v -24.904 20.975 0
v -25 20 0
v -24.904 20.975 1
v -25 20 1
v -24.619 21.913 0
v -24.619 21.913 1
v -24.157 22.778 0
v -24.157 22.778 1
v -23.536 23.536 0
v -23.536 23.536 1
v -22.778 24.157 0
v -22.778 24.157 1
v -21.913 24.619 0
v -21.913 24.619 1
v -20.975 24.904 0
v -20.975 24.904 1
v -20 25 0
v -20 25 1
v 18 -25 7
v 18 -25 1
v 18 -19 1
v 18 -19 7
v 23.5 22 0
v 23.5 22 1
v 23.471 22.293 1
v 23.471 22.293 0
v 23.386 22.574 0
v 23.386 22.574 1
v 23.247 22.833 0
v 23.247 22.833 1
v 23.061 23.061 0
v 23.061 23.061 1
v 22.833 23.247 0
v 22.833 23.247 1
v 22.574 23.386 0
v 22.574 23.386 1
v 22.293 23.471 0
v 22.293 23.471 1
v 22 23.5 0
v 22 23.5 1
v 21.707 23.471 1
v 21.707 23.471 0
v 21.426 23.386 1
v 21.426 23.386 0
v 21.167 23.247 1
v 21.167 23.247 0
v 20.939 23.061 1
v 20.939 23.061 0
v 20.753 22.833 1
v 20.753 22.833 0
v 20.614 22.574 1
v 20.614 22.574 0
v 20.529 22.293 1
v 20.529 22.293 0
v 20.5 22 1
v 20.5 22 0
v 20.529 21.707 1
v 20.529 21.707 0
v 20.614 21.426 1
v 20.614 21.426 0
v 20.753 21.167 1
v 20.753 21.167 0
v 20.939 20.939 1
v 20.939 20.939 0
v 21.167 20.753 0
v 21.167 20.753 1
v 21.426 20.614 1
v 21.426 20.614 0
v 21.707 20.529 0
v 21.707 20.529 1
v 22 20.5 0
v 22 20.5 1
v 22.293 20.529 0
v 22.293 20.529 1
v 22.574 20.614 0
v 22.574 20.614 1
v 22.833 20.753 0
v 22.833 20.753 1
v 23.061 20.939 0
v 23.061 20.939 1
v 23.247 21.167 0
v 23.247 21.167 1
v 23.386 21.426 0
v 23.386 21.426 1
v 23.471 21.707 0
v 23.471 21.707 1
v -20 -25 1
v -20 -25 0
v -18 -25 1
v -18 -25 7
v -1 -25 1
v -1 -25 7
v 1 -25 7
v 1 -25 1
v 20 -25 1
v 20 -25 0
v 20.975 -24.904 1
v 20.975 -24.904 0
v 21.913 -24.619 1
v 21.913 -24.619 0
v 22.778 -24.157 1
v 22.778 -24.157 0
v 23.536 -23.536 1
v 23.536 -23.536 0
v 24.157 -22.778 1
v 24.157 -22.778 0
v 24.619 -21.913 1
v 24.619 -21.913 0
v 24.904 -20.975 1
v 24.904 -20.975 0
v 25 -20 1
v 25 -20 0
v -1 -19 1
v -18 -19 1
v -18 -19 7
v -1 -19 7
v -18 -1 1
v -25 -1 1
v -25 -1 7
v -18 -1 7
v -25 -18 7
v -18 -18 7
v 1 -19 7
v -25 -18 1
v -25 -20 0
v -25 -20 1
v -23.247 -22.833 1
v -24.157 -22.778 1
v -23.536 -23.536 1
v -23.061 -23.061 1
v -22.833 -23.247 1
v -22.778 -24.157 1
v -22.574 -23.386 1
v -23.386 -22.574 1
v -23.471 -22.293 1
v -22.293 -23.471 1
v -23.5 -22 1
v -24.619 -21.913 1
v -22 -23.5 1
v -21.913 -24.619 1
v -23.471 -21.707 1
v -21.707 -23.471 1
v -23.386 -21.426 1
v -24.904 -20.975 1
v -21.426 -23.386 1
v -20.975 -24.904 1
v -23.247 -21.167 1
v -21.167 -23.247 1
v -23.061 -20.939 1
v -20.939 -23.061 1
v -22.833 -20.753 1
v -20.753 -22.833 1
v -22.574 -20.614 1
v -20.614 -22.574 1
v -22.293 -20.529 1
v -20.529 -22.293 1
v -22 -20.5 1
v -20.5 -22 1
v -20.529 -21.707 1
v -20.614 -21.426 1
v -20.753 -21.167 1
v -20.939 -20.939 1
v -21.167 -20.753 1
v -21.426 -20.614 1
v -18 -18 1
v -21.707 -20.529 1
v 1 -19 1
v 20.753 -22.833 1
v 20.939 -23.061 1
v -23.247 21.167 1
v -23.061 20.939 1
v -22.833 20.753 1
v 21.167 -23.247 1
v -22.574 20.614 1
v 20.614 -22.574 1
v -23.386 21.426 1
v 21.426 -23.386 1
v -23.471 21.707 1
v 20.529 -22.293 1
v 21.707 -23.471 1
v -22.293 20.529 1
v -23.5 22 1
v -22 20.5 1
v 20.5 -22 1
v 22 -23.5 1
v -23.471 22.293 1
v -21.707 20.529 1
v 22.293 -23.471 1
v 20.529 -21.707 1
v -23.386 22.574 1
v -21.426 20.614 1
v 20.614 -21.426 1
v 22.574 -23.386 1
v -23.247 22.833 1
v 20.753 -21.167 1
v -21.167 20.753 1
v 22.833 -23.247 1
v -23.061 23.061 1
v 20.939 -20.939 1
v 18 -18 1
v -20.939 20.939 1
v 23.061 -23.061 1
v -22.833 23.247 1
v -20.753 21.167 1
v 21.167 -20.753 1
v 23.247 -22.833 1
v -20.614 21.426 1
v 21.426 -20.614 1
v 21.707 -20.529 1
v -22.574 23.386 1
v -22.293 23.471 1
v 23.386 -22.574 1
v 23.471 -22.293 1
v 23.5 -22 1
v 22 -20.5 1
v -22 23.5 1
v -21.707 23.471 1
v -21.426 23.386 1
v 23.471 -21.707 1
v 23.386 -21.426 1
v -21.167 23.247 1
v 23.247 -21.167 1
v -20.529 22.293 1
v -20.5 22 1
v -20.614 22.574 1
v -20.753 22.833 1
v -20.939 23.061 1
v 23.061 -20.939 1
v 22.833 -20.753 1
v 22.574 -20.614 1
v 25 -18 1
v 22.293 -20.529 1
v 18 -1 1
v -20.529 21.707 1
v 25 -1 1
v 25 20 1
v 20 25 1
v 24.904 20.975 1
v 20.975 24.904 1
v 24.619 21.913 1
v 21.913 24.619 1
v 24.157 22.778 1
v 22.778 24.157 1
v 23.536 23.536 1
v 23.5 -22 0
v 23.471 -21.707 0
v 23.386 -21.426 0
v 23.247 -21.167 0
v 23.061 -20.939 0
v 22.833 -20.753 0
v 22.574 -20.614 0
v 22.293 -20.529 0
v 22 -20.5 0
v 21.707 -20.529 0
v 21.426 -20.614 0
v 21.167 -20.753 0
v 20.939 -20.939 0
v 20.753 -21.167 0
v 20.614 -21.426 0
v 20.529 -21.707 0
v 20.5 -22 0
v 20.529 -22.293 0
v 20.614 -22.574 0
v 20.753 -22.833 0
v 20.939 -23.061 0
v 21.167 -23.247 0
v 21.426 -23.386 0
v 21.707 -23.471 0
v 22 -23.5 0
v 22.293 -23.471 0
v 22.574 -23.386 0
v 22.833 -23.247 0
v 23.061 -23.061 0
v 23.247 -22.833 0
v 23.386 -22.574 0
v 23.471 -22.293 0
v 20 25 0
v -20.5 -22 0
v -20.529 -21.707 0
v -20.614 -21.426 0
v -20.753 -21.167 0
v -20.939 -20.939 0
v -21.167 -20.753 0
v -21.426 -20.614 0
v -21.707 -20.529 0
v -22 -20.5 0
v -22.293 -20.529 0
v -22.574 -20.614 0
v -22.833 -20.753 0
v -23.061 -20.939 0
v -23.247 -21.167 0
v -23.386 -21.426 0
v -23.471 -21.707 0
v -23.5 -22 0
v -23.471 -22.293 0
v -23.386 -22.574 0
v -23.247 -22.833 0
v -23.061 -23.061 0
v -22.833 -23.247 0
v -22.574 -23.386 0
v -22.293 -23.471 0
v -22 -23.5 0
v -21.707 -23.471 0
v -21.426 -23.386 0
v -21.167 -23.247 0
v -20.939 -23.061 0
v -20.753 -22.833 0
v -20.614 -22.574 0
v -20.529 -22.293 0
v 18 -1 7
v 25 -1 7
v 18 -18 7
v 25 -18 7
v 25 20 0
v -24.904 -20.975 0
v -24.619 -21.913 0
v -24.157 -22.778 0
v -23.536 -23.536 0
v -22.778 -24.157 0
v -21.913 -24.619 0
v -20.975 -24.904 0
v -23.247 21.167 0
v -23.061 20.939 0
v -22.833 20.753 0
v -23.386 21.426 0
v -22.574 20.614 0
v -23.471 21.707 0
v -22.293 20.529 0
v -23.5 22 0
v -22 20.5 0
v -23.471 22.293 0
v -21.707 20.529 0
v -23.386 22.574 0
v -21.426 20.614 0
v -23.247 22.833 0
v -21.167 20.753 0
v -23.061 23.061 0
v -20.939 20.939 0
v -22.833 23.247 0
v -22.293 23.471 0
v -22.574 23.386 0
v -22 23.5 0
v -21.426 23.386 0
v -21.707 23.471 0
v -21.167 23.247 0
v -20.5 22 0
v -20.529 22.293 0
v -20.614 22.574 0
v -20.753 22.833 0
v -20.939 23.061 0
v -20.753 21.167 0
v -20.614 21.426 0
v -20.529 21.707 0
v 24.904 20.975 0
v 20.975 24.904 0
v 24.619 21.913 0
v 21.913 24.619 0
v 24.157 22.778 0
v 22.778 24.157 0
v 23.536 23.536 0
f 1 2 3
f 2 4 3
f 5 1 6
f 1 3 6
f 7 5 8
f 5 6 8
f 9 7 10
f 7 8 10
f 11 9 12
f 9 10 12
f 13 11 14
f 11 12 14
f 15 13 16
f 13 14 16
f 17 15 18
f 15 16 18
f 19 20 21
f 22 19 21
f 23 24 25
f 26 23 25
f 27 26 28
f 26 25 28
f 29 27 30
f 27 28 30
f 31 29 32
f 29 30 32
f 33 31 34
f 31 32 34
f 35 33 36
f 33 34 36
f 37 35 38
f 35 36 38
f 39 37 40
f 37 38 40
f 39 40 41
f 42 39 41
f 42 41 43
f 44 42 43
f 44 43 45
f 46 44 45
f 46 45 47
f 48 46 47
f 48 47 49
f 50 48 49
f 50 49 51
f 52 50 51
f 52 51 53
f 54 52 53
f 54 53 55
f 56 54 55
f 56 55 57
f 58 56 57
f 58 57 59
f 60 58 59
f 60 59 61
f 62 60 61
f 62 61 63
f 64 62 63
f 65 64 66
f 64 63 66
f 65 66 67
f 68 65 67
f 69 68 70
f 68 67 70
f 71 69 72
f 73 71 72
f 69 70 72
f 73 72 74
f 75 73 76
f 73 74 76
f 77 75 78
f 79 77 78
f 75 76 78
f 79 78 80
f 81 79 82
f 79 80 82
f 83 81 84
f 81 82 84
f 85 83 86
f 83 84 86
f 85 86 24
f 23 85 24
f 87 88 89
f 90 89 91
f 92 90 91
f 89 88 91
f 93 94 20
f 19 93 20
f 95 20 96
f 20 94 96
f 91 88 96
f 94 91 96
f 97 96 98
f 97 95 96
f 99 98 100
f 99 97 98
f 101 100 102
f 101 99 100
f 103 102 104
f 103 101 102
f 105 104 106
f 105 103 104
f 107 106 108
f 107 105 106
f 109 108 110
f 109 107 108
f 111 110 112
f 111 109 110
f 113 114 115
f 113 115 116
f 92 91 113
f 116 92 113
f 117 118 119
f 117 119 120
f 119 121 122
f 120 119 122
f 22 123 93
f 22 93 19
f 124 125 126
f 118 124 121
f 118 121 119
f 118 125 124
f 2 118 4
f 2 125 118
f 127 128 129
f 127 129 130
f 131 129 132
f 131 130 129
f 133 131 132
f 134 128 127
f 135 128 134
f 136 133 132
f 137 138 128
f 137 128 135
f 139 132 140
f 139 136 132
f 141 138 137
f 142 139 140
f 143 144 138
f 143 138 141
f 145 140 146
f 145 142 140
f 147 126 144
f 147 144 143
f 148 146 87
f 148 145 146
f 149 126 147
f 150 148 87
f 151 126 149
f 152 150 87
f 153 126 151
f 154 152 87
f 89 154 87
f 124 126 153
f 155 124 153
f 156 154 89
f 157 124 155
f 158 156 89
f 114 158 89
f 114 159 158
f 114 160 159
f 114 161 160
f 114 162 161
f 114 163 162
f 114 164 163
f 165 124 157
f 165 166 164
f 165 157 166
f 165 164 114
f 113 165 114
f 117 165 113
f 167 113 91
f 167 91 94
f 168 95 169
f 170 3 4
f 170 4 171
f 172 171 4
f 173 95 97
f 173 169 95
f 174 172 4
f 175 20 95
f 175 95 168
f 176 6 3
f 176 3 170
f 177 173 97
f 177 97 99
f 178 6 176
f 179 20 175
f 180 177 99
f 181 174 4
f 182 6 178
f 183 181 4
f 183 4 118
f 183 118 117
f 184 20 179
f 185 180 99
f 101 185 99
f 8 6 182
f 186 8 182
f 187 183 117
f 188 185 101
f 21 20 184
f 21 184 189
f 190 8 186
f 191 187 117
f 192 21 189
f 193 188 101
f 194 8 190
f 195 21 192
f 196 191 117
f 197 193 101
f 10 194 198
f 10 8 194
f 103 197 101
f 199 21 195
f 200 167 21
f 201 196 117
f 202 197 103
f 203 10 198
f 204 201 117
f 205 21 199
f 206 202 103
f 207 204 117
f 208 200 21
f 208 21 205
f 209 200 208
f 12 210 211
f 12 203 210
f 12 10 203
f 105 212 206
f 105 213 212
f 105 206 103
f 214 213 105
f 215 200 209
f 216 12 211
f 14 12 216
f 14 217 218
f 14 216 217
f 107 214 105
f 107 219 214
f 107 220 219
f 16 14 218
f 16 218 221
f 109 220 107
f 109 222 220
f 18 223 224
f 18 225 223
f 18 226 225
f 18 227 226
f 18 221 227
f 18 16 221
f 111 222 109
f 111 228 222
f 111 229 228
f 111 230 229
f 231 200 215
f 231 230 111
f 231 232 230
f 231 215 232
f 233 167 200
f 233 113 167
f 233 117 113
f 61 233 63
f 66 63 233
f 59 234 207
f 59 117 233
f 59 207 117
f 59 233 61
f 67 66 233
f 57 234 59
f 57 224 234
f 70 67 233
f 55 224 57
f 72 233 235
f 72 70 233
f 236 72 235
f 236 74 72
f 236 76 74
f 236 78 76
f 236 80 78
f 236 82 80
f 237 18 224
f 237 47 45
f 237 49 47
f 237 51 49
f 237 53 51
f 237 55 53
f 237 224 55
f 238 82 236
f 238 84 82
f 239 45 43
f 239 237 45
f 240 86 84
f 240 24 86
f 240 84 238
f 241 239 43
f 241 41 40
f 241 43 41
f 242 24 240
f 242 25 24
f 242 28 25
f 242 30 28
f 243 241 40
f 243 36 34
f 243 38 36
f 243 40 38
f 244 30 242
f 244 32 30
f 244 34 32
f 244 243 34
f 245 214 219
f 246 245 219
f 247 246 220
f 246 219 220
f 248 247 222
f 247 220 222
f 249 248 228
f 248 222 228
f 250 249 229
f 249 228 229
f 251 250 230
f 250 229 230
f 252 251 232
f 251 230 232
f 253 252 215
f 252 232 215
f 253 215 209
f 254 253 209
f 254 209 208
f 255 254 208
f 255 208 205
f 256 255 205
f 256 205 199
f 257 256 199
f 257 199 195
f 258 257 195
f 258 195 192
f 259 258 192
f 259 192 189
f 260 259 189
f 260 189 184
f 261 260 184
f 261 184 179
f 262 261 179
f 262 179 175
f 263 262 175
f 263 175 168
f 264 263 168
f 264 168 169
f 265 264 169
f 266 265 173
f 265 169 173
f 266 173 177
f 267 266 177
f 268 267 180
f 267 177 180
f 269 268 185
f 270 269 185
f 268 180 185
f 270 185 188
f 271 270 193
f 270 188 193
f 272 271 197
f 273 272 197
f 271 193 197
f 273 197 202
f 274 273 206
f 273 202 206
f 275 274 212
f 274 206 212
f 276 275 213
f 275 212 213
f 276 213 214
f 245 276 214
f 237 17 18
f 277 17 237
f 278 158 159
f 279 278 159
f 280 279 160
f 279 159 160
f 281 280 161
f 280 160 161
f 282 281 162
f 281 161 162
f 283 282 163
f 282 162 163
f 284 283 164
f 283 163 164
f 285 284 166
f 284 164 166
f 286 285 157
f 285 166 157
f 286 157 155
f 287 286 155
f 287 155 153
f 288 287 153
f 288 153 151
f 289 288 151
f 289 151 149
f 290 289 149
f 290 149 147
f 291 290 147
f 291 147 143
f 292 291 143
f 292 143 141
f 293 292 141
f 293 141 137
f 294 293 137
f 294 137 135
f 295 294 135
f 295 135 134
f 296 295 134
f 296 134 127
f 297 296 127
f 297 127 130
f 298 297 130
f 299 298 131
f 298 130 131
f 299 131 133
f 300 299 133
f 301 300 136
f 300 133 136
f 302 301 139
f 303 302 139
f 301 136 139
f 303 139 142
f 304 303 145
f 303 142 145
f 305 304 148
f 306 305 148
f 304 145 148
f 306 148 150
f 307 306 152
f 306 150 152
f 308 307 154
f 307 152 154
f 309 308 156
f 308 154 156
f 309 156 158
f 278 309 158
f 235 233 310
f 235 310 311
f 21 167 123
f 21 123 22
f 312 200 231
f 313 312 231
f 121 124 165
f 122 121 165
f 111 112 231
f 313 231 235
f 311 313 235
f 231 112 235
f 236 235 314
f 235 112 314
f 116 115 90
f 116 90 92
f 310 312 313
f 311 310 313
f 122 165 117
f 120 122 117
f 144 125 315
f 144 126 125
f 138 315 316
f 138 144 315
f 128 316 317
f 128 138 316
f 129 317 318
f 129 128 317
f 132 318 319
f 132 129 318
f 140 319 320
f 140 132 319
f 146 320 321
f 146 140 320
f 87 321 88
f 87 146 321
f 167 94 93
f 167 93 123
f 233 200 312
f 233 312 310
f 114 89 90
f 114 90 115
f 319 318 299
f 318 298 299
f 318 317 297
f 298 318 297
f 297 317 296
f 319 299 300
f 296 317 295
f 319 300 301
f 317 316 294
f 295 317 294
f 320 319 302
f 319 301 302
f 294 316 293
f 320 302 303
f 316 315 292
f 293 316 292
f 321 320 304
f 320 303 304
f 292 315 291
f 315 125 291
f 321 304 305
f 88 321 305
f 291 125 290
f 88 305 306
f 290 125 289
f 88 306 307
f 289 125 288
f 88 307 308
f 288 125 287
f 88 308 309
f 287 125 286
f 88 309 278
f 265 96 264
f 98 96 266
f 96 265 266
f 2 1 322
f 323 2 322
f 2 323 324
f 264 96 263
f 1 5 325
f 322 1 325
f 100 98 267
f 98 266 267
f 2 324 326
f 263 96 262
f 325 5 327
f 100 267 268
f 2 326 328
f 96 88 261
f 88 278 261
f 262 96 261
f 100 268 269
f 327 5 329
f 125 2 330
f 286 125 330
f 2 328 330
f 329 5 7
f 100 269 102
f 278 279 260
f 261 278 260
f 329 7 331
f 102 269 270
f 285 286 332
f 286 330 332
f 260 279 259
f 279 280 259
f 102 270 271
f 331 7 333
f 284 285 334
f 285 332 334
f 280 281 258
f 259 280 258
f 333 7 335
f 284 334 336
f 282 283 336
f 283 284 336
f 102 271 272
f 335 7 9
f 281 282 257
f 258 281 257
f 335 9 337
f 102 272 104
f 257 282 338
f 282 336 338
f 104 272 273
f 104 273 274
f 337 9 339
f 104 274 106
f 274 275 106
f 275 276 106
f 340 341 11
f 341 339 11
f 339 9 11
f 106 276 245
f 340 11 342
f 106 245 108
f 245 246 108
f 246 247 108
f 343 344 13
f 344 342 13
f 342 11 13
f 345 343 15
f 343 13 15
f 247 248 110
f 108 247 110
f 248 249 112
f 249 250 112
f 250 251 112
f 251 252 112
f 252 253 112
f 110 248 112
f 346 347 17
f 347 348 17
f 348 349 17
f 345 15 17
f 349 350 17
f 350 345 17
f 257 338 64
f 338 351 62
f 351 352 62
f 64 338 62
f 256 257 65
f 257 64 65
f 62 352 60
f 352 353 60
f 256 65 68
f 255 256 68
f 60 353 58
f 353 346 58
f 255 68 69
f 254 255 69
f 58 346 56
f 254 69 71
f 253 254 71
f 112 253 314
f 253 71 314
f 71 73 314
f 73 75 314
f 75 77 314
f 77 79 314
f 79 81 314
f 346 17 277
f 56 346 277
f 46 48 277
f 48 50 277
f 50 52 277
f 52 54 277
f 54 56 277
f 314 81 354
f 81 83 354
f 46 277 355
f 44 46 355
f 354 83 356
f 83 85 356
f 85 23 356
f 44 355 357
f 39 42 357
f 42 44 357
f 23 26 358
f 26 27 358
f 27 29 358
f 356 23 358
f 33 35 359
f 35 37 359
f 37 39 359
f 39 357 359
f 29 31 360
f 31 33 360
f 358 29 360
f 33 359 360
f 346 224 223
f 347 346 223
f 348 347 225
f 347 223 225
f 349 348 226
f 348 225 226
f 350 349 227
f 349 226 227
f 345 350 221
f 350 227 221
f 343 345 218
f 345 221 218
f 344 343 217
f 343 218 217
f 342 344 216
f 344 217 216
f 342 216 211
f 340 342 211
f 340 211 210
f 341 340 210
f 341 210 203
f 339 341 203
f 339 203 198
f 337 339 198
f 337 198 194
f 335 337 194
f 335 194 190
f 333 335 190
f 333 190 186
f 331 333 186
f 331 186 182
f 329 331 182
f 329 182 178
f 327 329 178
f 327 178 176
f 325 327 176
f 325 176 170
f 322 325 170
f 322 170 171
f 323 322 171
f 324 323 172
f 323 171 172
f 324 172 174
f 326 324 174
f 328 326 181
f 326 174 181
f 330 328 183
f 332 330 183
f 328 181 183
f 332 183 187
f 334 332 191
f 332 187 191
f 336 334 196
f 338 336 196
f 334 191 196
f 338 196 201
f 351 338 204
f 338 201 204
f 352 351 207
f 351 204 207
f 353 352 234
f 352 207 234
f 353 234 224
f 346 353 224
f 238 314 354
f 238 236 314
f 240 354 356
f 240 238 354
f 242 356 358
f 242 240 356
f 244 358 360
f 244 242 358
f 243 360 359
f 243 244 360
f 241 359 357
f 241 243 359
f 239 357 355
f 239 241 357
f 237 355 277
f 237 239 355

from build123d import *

# Parameters (mm, degrees)
SKETCH_1_W          = 50
SKETCH_1_H          = 50
EXTRUDE_1_DEPTH     = 1
FILLET_1_R          = 5
SKETCH_2_W          = 17
SKETCH_2_H          = 6
SKETCH_2_W_2        = 7
SKETCH_2_H_2        = 17
EXTRUDE_2_DEPTH     = 6
SKETCH_3_R          = 1.5
CUT_EXTRUDE_1_DEPTH = 10


with BuildPart() as part:
    # 草图1 → 凸台-拉伸1 (new body)
    with BuildSketch(Plane.XY):
        Rectangle(SKETCH_1_W, SKETCH_1_H)
    extrude(amount=EXTRUDE_1_DEPTH)

    # 圆角1
    fillet_1_edges = [part.edges().sort_by_distance(p)[0] for p in [
        (-25, 25, 0.5),
        (25, 25, 0.5),
        (25, -25, 0.5),
        (-25, -25, 0.5),
    ]]
    fillet(fillet_1_edges, radius=FILLET_1_R)

    # 草图2 → 凸台-拉伸2 (add)
    with BuildSketch(Plane.XY.offset(1)):
        with Locations((-9.5, -22)):
            Rectangle(SKETCH_2_W, SKETCH_2_H)
        with Locations((-21.5, -9.5)):
            Rectangle(SKETCH_2_W_2, SKETCH_2_H_2)
        with Locations((9.5, -22)):
            Rectangle(SKETCH_2_W, SKETCH_2_H)
        with Locations((21.5, -9.5)):
            Rectangle(SKETCH_2_W_2, SKETCH_2_H_2)
    extrude(amount=EXTRUDE_2_DEPTH)

    # 草图3 → 切除-拉伸1 (cut)
    with BuildSketch(Plane.XY.offset(1)):
        with Locations((-22, 22)):
            Circle(SKETCH_3_R)
        with Locations((22, 22)):
            Circle(SKETCH_3_R)
        with Locations((-22, -22)):
            Circle(SKETCH_3_R)
        with Locations((22, -22)):
            Circle(SKETCH_3_R)
    extrude(amount=-CUT_EXTRUDE_1_DEPTH, mode=Mode.SUBTRACT)


solid = part.part
